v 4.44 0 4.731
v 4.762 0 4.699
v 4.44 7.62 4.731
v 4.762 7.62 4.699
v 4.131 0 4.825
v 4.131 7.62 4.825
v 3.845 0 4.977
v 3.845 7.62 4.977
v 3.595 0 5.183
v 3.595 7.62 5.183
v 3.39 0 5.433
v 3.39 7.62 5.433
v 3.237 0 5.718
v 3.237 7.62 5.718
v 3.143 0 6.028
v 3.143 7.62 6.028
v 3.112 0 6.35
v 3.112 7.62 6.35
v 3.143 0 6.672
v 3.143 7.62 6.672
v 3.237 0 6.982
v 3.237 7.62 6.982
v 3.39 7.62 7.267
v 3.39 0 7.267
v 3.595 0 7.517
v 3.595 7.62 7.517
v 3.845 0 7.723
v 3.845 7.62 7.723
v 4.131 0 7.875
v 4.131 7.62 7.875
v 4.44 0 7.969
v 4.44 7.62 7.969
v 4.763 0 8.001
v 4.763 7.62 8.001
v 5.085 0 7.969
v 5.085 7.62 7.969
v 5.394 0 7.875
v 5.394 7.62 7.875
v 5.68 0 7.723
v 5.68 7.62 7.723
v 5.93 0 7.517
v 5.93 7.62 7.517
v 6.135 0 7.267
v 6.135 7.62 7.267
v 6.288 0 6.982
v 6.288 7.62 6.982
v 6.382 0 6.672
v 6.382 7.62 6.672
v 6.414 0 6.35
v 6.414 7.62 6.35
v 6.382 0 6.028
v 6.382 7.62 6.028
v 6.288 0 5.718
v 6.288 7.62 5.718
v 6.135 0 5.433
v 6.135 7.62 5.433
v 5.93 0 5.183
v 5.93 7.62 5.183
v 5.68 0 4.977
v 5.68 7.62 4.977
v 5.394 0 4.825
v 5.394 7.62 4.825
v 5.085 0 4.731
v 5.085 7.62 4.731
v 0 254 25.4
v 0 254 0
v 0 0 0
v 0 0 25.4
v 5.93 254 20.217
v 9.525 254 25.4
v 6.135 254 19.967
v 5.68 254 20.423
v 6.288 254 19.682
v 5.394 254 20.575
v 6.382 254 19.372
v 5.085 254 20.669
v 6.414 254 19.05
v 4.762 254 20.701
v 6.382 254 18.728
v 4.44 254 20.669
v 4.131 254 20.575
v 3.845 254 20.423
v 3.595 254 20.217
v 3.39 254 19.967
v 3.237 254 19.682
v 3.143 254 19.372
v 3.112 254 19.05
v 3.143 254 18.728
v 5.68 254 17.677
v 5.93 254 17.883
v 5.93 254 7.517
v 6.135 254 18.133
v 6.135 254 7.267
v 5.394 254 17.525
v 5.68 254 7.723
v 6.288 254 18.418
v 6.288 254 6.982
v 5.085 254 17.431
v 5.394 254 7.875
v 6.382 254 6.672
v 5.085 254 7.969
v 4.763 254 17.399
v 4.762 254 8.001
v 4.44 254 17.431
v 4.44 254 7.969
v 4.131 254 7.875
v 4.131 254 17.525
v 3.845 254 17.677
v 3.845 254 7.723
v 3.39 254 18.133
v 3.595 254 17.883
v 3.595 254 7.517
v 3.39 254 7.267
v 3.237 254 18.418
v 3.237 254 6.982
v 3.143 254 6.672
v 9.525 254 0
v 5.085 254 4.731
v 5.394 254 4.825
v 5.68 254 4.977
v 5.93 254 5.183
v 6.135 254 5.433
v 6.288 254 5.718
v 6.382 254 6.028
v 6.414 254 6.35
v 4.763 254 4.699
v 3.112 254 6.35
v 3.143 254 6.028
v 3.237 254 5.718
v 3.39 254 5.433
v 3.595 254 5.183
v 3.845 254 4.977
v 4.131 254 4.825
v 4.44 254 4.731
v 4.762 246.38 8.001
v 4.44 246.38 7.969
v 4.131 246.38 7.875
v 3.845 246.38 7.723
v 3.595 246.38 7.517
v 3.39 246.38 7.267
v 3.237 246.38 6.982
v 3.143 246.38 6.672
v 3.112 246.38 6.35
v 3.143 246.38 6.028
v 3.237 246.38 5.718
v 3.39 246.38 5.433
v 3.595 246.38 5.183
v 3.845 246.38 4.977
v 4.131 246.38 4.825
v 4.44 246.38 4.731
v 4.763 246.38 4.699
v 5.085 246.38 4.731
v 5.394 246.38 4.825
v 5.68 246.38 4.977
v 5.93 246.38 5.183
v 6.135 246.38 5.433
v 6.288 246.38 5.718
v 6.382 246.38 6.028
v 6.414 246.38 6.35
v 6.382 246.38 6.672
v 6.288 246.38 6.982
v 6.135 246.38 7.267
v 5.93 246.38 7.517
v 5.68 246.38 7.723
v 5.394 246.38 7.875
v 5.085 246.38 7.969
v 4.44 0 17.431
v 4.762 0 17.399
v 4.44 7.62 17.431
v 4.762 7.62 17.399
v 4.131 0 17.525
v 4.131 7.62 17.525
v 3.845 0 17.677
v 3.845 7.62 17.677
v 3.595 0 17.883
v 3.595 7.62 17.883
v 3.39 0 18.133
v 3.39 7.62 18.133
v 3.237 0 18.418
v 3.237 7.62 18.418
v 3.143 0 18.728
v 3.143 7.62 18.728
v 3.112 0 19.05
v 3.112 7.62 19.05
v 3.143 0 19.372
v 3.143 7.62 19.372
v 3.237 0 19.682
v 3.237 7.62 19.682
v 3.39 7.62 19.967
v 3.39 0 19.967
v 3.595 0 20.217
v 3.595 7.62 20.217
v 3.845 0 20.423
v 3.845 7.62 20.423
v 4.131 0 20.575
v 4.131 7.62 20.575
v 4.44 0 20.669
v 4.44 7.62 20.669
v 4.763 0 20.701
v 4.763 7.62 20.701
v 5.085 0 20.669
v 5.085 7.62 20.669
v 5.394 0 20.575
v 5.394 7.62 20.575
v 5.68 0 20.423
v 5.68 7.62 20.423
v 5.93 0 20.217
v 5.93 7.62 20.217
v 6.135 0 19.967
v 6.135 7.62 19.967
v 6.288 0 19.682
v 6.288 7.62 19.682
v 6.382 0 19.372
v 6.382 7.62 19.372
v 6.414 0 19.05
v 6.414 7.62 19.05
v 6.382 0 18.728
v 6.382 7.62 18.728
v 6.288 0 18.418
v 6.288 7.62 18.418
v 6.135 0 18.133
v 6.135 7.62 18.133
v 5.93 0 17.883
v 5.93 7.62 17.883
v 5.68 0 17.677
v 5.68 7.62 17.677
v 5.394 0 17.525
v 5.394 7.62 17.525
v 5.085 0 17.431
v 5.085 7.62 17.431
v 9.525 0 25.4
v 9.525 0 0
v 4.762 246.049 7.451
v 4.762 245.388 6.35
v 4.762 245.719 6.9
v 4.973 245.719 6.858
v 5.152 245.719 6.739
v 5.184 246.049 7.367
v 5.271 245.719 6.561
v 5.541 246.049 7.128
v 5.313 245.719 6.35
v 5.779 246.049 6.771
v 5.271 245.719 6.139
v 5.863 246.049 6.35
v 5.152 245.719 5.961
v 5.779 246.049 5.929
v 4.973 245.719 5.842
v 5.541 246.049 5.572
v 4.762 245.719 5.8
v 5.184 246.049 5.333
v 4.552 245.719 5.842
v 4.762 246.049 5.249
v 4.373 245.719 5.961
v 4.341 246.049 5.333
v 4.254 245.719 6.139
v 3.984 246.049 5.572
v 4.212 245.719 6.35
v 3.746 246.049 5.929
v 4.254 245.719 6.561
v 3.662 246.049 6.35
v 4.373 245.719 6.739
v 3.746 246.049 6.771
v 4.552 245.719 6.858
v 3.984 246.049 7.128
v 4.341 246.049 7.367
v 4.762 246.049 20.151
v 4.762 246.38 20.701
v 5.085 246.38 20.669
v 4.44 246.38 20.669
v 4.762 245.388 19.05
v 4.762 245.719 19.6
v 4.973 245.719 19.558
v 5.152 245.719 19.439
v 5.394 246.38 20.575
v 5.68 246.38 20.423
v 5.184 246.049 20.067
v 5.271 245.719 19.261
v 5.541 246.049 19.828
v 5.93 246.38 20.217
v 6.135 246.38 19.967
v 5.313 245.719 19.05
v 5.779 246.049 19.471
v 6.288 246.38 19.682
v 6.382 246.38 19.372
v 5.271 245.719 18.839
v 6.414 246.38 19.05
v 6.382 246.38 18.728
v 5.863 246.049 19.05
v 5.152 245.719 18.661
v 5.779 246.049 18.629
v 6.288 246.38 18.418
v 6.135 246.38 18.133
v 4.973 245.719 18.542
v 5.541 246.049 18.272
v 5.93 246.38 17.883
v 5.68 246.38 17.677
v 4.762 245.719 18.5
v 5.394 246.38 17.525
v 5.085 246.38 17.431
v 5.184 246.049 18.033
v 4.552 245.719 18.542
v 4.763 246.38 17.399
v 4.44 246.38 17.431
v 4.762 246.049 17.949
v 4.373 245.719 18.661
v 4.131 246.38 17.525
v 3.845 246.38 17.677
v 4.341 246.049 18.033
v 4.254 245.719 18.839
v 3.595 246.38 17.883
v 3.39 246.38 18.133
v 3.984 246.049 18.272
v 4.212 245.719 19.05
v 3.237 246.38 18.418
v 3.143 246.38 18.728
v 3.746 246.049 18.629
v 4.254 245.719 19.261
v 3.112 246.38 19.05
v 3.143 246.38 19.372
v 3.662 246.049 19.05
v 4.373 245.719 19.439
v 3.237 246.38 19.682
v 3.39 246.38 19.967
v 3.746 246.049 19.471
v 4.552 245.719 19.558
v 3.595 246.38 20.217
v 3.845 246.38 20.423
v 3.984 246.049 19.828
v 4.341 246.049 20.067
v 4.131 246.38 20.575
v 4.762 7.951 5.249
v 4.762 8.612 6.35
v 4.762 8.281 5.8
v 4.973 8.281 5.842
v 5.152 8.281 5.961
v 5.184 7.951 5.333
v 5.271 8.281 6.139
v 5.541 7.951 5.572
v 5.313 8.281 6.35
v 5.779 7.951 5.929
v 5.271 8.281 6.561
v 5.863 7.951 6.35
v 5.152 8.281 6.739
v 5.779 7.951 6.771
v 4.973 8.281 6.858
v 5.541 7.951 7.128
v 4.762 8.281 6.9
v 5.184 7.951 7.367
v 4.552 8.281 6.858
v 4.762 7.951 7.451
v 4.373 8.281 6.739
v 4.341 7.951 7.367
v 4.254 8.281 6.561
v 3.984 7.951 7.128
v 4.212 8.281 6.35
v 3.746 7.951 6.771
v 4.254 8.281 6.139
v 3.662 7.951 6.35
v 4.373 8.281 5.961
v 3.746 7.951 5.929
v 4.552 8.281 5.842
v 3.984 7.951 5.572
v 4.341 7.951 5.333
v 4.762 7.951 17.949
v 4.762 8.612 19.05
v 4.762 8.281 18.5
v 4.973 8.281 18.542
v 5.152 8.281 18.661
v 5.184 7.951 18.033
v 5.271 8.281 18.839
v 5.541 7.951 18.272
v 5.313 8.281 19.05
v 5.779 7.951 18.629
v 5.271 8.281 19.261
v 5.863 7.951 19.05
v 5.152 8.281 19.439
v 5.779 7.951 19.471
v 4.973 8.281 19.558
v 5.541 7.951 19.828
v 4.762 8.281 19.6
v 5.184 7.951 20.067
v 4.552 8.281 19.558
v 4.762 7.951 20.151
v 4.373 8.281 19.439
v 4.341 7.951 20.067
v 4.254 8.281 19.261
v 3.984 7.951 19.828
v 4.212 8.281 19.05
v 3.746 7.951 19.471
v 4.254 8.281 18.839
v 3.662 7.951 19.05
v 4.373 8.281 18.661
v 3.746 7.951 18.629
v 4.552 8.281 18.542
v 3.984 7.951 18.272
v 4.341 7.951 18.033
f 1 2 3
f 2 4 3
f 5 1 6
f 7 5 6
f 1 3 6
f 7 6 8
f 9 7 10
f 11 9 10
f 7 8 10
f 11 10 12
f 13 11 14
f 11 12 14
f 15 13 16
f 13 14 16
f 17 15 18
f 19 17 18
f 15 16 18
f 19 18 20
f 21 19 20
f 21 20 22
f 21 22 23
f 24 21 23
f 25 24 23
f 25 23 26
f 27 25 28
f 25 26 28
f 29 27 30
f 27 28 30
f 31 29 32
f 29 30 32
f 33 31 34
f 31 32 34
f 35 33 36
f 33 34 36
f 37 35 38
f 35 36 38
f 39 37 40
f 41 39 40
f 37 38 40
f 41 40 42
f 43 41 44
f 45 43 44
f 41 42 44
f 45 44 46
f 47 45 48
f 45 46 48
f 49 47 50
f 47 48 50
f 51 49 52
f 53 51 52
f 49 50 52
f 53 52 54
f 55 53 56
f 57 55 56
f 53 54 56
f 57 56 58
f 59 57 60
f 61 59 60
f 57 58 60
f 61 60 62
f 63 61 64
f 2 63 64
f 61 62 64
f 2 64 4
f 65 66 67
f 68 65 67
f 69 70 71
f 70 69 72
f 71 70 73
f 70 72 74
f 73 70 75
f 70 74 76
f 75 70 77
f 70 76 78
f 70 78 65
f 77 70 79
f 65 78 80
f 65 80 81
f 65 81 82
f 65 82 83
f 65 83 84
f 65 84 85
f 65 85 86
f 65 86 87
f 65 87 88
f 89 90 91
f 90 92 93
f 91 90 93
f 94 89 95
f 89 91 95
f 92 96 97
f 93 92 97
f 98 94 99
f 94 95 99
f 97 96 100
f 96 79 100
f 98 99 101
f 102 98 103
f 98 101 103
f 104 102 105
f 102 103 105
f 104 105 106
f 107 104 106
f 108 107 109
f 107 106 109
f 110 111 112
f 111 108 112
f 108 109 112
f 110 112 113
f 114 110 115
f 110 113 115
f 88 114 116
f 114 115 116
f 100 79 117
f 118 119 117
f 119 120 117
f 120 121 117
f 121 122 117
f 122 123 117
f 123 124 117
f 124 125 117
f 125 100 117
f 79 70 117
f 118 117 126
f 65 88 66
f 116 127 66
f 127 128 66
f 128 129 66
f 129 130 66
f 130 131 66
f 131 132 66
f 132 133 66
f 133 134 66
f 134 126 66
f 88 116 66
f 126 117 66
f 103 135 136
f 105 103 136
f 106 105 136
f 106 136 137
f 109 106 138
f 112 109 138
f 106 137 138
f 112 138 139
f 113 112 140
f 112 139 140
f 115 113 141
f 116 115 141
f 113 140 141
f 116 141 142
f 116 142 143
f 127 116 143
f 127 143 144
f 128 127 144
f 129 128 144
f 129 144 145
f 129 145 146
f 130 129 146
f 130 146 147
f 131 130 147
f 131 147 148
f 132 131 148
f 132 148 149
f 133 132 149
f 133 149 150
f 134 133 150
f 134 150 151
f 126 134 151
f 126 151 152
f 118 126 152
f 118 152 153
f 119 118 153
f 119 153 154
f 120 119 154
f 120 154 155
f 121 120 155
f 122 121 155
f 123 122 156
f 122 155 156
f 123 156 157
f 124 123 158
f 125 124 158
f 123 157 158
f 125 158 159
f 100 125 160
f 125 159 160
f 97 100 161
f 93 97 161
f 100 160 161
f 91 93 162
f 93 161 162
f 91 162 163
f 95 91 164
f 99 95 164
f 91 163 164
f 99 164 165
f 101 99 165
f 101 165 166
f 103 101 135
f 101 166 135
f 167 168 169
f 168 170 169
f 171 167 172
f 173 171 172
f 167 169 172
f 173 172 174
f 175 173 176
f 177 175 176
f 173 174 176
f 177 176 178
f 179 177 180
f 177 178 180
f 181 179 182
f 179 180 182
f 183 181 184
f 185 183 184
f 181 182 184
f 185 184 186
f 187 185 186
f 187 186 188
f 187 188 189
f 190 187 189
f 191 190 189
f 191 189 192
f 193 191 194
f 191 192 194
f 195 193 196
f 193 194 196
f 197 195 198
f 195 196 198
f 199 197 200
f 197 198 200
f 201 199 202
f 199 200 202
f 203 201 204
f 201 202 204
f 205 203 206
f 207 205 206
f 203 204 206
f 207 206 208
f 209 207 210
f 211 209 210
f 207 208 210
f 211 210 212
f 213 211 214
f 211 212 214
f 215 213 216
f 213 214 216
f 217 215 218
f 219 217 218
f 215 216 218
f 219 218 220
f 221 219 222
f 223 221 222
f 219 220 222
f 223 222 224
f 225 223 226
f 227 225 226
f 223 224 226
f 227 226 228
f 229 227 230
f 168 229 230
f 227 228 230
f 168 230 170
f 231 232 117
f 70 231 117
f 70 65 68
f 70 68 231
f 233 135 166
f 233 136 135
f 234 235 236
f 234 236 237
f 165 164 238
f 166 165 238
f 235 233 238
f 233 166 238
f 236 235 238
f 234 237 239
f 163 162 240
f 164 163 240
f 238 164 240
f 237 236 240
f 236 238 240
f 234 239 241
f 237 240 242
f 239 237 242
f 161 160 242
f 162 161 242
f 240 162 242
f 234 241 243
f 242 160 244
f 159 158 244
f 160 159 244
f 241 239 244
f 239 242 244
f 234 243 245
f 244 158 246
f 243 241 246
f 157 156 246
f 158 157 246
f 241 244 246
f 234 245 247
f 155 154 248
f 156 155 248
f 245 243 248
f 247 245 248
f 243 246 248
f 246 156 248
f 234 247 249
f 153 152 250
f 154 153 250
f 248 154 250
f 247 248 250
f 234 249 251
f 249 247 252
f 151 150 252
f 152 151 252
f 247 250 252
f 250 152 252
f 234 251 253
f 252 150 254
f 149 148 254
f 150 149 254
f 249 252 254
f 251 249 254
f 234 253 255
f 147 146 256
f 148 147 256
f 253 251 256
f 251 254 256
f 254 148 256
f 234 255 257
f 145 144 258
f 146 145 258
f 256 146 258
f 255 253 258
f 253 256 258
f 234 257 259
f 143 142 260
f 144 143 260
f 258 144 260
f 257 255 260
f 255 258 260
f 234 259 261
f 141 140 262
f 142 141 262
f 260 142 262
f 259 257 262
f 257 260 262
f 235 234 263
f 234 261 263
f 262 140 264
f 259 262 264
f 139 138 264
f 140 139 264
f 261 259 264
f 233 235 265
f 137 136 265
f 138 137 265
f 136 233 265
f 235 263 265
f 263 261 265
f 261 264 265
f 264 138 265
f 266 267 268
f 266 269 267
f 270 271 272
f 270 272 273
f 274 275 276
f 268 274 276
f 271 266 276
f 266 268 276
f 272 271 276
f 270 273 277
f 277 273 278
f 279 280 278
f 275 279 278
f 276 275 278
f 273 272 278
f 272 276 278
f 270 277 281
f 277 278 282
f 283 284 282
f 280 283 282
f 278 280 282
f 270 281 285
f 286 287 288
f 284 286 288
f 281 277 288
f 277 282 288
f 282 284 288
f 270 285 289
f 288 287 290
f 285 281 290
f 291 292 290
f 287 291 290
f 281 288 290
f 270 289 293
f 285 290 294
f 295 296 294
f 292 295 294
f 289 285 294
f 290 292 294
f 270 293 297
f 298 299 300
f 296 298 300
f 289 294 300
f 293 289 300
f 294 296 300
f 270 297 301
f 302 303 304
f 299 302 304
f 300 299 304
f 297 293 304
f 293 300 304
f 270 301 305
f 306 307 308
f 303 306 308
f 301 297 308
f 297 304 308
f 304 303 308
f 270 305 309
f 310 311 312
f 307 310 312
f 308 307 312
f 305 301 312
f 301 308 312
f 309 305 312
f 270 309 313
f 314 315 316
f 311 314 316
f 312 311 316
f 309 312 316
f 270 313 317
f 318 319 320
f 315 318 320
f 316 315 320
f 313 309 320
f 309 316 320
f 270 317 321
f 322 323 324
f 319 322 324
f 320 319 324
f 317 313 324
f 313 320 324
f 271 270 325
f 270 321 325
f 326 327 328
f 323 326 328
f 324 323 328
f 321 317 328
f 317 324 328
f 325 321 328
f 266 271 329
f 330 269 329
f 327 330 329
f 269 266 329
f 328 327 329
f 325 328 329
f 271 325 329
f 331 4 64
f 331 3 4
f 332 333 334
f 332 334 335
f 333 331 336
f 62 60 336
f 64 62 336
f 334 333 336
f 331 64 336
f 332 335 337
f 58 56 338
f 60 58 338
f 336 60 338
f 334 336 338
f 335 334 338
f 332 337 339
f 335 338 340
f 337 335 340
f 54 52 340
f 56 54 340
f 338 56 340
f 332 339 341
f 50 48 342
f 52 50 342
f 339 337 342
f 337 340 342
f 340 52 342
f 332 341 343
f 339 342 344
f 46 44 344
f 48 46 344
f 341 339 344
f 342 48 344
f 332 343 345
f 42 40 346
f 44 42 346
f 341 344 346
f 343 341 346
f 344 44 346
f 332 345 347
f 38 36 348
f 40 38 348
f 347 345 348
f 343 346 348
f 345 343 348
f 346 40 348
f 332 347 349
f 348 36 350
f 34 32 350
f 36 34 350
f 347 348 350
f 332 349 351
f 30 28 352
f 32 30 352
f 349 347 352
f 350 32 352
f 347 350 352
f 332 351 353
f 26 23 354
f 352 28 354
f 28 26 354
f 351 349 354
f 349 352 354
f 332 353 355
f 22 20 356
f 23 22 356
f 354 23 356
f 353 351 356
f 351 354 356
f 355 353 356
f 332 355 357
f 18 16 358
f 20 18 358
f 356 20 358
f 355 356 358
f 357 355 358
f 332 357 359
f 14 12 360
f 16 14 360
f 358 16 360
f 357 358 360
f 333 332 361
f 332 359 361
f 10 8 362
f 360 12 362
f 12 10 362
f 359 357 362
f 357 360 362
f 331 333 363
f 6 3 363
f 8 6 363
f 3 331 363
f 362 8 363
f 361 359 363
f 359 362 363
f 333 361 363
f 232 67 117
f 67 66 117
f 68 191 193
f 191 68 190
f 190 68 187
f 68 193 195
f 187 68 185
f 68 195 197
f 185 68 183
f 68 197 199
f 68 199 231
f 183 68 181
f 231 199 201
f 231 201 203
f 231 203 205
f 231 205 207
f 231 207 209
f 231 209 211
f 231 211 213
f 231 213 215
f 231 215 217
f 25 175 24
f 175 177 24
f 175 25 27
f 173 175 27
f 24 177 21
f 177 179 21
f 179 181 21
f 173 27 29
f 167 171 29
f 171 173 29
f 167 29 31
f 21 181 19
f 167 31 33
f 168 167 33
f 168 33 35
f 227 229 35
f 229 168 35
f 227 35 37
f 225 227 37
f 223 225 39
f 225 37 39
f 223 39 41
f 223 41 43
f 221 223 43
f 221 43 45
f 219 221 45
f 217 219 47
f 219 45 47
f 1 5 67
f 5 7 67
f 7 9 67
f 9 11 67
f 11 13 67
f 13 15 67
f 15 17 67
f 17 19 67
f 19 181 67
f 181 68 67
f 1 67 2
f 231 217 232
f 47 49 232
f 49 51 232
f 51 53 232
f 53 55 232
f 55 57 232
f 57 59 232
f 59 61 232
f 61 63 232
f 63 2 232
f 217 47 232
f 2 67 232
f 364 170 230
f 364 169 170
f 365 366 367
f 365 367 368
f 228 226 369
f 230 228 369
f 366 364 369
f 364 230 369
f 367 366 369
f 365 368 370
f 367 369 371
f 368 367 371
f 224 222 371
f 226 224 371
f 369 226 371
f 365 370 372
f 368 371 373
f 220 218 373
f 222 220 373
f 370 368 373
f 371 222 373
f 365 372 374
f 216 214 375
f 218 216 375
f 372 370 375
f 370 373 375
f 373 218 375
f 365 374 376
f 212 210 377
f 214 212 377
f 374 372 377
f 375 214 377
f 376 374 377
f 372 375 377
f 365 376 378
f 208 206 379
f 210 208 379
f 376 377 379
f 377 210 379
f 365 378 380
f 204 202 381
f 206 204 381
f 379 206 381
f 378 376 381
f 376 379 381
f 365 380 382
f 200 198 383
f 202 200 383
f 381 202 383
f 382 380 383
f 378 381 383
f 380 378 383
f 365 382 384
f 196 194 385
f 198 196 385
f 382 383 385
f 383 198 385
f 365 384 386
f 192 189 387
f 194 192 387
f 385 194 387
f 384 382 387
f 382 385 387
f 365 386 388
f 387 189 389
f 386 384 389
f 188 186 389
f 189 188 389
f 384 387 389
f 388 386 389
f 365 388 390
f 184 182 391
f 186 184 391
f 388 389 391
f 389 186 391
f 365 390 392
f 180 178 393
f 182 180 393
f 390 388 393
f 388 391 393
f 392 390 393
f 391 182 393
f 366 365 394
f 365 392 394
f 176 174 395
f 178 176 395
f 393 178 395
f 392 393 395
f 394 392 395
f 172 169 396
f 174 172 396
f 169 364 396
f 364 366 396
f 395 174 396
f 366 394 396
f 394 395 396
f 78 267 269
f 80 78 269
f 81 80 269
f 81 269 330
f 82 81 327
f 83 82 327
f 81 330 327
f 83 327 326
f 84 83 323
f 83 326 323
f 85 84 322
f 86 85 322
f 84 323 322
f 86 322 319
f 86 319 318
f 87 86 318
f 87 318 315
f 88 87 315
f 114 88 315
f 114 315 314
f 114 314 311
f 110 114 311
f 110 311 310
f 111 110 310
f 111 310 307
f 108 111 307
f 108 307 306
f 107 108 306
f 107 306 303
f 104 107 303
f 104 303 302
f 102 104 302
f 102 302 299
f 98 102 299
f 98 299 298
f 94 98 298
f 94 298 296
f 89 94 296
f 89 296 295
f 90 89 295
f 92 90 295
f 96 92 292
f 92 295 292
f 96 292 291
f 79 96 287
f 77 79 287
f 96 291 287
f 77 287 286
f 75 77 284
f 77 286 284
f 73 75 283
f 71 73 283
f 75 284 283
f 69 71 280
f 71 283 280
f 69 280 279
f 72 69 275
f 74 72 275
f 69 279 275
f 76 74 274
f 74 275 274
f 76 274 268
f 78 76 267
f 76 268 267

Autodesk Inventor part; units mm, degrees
ref_plane "YZ Plane" through (0, 0, 0) normal (1, 0, 0) x (0, 1, 0)
ref_plane "XZ Plane" through (0, 0, 0) normal (0, 1, 0) x (-1, 0, 0)
ref_plane "XY Plane" through (0, 0, 0) normal (0, 0, 1) x (1, 0, 0)
sketch "Sketch1" plane through (0, 0, 0) normal (0, 0, 1) x (1, 0, 0)
  line L0 (0, 0) -> (9.525, 0)
  line L1 (9.525, 0) -> (9.525, 254)
  line L2 (9.525, 254) -> (0, 254)
  line L3 (0, 254) -> (0, 0)
  dimension "d0" = 9.525
  dimension "d1" = 254
extrude "Extrusion1" add sketch "Sketch1" along normal blind 25.4
sketch "Sketch2" plane through (0, 254, 0) normal (0, 1, 0) x (1, 0, 0)
  line L0 (0, 0) -> (9.525, 0) projected
  line L1 (0, -25.4) -> (9.525, -25.4) projected
  point P0 (4.7625, -19.05)
  point P1 (4.7625, -6.35)
hole "Hole1" at (4.7625, 254, 19.05) at (4.7625, 254, 6.35) direction (0, -1, 0) diameter 3.302 depth 7.62 tip angle 118 thread size "8-32 UNC" class "2B" standard "ANSI Unified Screw Threads"
sketch "Sketch3" plane through (0, 0, 0) normal (0, -1, 0) x (1, 0, 0)
  line L0 (9.525, 0) -> (0, 0) projected
  circle A0 centre (4.7625, 19.05) radius 1.651 projected
  point P0 (4.7625, 6.35)
hole "Hole2" at (4.7625, 0, 19.05) at (4.7625, 0, 6.35) direction (0, 1, 0) diameter 3.302 depth 7.62 tip angle 118 thread size "8-32 UNC" class "2B" standard "ANSI Unified Screw Threads"
properties part number "TopPlateRightConnector"
